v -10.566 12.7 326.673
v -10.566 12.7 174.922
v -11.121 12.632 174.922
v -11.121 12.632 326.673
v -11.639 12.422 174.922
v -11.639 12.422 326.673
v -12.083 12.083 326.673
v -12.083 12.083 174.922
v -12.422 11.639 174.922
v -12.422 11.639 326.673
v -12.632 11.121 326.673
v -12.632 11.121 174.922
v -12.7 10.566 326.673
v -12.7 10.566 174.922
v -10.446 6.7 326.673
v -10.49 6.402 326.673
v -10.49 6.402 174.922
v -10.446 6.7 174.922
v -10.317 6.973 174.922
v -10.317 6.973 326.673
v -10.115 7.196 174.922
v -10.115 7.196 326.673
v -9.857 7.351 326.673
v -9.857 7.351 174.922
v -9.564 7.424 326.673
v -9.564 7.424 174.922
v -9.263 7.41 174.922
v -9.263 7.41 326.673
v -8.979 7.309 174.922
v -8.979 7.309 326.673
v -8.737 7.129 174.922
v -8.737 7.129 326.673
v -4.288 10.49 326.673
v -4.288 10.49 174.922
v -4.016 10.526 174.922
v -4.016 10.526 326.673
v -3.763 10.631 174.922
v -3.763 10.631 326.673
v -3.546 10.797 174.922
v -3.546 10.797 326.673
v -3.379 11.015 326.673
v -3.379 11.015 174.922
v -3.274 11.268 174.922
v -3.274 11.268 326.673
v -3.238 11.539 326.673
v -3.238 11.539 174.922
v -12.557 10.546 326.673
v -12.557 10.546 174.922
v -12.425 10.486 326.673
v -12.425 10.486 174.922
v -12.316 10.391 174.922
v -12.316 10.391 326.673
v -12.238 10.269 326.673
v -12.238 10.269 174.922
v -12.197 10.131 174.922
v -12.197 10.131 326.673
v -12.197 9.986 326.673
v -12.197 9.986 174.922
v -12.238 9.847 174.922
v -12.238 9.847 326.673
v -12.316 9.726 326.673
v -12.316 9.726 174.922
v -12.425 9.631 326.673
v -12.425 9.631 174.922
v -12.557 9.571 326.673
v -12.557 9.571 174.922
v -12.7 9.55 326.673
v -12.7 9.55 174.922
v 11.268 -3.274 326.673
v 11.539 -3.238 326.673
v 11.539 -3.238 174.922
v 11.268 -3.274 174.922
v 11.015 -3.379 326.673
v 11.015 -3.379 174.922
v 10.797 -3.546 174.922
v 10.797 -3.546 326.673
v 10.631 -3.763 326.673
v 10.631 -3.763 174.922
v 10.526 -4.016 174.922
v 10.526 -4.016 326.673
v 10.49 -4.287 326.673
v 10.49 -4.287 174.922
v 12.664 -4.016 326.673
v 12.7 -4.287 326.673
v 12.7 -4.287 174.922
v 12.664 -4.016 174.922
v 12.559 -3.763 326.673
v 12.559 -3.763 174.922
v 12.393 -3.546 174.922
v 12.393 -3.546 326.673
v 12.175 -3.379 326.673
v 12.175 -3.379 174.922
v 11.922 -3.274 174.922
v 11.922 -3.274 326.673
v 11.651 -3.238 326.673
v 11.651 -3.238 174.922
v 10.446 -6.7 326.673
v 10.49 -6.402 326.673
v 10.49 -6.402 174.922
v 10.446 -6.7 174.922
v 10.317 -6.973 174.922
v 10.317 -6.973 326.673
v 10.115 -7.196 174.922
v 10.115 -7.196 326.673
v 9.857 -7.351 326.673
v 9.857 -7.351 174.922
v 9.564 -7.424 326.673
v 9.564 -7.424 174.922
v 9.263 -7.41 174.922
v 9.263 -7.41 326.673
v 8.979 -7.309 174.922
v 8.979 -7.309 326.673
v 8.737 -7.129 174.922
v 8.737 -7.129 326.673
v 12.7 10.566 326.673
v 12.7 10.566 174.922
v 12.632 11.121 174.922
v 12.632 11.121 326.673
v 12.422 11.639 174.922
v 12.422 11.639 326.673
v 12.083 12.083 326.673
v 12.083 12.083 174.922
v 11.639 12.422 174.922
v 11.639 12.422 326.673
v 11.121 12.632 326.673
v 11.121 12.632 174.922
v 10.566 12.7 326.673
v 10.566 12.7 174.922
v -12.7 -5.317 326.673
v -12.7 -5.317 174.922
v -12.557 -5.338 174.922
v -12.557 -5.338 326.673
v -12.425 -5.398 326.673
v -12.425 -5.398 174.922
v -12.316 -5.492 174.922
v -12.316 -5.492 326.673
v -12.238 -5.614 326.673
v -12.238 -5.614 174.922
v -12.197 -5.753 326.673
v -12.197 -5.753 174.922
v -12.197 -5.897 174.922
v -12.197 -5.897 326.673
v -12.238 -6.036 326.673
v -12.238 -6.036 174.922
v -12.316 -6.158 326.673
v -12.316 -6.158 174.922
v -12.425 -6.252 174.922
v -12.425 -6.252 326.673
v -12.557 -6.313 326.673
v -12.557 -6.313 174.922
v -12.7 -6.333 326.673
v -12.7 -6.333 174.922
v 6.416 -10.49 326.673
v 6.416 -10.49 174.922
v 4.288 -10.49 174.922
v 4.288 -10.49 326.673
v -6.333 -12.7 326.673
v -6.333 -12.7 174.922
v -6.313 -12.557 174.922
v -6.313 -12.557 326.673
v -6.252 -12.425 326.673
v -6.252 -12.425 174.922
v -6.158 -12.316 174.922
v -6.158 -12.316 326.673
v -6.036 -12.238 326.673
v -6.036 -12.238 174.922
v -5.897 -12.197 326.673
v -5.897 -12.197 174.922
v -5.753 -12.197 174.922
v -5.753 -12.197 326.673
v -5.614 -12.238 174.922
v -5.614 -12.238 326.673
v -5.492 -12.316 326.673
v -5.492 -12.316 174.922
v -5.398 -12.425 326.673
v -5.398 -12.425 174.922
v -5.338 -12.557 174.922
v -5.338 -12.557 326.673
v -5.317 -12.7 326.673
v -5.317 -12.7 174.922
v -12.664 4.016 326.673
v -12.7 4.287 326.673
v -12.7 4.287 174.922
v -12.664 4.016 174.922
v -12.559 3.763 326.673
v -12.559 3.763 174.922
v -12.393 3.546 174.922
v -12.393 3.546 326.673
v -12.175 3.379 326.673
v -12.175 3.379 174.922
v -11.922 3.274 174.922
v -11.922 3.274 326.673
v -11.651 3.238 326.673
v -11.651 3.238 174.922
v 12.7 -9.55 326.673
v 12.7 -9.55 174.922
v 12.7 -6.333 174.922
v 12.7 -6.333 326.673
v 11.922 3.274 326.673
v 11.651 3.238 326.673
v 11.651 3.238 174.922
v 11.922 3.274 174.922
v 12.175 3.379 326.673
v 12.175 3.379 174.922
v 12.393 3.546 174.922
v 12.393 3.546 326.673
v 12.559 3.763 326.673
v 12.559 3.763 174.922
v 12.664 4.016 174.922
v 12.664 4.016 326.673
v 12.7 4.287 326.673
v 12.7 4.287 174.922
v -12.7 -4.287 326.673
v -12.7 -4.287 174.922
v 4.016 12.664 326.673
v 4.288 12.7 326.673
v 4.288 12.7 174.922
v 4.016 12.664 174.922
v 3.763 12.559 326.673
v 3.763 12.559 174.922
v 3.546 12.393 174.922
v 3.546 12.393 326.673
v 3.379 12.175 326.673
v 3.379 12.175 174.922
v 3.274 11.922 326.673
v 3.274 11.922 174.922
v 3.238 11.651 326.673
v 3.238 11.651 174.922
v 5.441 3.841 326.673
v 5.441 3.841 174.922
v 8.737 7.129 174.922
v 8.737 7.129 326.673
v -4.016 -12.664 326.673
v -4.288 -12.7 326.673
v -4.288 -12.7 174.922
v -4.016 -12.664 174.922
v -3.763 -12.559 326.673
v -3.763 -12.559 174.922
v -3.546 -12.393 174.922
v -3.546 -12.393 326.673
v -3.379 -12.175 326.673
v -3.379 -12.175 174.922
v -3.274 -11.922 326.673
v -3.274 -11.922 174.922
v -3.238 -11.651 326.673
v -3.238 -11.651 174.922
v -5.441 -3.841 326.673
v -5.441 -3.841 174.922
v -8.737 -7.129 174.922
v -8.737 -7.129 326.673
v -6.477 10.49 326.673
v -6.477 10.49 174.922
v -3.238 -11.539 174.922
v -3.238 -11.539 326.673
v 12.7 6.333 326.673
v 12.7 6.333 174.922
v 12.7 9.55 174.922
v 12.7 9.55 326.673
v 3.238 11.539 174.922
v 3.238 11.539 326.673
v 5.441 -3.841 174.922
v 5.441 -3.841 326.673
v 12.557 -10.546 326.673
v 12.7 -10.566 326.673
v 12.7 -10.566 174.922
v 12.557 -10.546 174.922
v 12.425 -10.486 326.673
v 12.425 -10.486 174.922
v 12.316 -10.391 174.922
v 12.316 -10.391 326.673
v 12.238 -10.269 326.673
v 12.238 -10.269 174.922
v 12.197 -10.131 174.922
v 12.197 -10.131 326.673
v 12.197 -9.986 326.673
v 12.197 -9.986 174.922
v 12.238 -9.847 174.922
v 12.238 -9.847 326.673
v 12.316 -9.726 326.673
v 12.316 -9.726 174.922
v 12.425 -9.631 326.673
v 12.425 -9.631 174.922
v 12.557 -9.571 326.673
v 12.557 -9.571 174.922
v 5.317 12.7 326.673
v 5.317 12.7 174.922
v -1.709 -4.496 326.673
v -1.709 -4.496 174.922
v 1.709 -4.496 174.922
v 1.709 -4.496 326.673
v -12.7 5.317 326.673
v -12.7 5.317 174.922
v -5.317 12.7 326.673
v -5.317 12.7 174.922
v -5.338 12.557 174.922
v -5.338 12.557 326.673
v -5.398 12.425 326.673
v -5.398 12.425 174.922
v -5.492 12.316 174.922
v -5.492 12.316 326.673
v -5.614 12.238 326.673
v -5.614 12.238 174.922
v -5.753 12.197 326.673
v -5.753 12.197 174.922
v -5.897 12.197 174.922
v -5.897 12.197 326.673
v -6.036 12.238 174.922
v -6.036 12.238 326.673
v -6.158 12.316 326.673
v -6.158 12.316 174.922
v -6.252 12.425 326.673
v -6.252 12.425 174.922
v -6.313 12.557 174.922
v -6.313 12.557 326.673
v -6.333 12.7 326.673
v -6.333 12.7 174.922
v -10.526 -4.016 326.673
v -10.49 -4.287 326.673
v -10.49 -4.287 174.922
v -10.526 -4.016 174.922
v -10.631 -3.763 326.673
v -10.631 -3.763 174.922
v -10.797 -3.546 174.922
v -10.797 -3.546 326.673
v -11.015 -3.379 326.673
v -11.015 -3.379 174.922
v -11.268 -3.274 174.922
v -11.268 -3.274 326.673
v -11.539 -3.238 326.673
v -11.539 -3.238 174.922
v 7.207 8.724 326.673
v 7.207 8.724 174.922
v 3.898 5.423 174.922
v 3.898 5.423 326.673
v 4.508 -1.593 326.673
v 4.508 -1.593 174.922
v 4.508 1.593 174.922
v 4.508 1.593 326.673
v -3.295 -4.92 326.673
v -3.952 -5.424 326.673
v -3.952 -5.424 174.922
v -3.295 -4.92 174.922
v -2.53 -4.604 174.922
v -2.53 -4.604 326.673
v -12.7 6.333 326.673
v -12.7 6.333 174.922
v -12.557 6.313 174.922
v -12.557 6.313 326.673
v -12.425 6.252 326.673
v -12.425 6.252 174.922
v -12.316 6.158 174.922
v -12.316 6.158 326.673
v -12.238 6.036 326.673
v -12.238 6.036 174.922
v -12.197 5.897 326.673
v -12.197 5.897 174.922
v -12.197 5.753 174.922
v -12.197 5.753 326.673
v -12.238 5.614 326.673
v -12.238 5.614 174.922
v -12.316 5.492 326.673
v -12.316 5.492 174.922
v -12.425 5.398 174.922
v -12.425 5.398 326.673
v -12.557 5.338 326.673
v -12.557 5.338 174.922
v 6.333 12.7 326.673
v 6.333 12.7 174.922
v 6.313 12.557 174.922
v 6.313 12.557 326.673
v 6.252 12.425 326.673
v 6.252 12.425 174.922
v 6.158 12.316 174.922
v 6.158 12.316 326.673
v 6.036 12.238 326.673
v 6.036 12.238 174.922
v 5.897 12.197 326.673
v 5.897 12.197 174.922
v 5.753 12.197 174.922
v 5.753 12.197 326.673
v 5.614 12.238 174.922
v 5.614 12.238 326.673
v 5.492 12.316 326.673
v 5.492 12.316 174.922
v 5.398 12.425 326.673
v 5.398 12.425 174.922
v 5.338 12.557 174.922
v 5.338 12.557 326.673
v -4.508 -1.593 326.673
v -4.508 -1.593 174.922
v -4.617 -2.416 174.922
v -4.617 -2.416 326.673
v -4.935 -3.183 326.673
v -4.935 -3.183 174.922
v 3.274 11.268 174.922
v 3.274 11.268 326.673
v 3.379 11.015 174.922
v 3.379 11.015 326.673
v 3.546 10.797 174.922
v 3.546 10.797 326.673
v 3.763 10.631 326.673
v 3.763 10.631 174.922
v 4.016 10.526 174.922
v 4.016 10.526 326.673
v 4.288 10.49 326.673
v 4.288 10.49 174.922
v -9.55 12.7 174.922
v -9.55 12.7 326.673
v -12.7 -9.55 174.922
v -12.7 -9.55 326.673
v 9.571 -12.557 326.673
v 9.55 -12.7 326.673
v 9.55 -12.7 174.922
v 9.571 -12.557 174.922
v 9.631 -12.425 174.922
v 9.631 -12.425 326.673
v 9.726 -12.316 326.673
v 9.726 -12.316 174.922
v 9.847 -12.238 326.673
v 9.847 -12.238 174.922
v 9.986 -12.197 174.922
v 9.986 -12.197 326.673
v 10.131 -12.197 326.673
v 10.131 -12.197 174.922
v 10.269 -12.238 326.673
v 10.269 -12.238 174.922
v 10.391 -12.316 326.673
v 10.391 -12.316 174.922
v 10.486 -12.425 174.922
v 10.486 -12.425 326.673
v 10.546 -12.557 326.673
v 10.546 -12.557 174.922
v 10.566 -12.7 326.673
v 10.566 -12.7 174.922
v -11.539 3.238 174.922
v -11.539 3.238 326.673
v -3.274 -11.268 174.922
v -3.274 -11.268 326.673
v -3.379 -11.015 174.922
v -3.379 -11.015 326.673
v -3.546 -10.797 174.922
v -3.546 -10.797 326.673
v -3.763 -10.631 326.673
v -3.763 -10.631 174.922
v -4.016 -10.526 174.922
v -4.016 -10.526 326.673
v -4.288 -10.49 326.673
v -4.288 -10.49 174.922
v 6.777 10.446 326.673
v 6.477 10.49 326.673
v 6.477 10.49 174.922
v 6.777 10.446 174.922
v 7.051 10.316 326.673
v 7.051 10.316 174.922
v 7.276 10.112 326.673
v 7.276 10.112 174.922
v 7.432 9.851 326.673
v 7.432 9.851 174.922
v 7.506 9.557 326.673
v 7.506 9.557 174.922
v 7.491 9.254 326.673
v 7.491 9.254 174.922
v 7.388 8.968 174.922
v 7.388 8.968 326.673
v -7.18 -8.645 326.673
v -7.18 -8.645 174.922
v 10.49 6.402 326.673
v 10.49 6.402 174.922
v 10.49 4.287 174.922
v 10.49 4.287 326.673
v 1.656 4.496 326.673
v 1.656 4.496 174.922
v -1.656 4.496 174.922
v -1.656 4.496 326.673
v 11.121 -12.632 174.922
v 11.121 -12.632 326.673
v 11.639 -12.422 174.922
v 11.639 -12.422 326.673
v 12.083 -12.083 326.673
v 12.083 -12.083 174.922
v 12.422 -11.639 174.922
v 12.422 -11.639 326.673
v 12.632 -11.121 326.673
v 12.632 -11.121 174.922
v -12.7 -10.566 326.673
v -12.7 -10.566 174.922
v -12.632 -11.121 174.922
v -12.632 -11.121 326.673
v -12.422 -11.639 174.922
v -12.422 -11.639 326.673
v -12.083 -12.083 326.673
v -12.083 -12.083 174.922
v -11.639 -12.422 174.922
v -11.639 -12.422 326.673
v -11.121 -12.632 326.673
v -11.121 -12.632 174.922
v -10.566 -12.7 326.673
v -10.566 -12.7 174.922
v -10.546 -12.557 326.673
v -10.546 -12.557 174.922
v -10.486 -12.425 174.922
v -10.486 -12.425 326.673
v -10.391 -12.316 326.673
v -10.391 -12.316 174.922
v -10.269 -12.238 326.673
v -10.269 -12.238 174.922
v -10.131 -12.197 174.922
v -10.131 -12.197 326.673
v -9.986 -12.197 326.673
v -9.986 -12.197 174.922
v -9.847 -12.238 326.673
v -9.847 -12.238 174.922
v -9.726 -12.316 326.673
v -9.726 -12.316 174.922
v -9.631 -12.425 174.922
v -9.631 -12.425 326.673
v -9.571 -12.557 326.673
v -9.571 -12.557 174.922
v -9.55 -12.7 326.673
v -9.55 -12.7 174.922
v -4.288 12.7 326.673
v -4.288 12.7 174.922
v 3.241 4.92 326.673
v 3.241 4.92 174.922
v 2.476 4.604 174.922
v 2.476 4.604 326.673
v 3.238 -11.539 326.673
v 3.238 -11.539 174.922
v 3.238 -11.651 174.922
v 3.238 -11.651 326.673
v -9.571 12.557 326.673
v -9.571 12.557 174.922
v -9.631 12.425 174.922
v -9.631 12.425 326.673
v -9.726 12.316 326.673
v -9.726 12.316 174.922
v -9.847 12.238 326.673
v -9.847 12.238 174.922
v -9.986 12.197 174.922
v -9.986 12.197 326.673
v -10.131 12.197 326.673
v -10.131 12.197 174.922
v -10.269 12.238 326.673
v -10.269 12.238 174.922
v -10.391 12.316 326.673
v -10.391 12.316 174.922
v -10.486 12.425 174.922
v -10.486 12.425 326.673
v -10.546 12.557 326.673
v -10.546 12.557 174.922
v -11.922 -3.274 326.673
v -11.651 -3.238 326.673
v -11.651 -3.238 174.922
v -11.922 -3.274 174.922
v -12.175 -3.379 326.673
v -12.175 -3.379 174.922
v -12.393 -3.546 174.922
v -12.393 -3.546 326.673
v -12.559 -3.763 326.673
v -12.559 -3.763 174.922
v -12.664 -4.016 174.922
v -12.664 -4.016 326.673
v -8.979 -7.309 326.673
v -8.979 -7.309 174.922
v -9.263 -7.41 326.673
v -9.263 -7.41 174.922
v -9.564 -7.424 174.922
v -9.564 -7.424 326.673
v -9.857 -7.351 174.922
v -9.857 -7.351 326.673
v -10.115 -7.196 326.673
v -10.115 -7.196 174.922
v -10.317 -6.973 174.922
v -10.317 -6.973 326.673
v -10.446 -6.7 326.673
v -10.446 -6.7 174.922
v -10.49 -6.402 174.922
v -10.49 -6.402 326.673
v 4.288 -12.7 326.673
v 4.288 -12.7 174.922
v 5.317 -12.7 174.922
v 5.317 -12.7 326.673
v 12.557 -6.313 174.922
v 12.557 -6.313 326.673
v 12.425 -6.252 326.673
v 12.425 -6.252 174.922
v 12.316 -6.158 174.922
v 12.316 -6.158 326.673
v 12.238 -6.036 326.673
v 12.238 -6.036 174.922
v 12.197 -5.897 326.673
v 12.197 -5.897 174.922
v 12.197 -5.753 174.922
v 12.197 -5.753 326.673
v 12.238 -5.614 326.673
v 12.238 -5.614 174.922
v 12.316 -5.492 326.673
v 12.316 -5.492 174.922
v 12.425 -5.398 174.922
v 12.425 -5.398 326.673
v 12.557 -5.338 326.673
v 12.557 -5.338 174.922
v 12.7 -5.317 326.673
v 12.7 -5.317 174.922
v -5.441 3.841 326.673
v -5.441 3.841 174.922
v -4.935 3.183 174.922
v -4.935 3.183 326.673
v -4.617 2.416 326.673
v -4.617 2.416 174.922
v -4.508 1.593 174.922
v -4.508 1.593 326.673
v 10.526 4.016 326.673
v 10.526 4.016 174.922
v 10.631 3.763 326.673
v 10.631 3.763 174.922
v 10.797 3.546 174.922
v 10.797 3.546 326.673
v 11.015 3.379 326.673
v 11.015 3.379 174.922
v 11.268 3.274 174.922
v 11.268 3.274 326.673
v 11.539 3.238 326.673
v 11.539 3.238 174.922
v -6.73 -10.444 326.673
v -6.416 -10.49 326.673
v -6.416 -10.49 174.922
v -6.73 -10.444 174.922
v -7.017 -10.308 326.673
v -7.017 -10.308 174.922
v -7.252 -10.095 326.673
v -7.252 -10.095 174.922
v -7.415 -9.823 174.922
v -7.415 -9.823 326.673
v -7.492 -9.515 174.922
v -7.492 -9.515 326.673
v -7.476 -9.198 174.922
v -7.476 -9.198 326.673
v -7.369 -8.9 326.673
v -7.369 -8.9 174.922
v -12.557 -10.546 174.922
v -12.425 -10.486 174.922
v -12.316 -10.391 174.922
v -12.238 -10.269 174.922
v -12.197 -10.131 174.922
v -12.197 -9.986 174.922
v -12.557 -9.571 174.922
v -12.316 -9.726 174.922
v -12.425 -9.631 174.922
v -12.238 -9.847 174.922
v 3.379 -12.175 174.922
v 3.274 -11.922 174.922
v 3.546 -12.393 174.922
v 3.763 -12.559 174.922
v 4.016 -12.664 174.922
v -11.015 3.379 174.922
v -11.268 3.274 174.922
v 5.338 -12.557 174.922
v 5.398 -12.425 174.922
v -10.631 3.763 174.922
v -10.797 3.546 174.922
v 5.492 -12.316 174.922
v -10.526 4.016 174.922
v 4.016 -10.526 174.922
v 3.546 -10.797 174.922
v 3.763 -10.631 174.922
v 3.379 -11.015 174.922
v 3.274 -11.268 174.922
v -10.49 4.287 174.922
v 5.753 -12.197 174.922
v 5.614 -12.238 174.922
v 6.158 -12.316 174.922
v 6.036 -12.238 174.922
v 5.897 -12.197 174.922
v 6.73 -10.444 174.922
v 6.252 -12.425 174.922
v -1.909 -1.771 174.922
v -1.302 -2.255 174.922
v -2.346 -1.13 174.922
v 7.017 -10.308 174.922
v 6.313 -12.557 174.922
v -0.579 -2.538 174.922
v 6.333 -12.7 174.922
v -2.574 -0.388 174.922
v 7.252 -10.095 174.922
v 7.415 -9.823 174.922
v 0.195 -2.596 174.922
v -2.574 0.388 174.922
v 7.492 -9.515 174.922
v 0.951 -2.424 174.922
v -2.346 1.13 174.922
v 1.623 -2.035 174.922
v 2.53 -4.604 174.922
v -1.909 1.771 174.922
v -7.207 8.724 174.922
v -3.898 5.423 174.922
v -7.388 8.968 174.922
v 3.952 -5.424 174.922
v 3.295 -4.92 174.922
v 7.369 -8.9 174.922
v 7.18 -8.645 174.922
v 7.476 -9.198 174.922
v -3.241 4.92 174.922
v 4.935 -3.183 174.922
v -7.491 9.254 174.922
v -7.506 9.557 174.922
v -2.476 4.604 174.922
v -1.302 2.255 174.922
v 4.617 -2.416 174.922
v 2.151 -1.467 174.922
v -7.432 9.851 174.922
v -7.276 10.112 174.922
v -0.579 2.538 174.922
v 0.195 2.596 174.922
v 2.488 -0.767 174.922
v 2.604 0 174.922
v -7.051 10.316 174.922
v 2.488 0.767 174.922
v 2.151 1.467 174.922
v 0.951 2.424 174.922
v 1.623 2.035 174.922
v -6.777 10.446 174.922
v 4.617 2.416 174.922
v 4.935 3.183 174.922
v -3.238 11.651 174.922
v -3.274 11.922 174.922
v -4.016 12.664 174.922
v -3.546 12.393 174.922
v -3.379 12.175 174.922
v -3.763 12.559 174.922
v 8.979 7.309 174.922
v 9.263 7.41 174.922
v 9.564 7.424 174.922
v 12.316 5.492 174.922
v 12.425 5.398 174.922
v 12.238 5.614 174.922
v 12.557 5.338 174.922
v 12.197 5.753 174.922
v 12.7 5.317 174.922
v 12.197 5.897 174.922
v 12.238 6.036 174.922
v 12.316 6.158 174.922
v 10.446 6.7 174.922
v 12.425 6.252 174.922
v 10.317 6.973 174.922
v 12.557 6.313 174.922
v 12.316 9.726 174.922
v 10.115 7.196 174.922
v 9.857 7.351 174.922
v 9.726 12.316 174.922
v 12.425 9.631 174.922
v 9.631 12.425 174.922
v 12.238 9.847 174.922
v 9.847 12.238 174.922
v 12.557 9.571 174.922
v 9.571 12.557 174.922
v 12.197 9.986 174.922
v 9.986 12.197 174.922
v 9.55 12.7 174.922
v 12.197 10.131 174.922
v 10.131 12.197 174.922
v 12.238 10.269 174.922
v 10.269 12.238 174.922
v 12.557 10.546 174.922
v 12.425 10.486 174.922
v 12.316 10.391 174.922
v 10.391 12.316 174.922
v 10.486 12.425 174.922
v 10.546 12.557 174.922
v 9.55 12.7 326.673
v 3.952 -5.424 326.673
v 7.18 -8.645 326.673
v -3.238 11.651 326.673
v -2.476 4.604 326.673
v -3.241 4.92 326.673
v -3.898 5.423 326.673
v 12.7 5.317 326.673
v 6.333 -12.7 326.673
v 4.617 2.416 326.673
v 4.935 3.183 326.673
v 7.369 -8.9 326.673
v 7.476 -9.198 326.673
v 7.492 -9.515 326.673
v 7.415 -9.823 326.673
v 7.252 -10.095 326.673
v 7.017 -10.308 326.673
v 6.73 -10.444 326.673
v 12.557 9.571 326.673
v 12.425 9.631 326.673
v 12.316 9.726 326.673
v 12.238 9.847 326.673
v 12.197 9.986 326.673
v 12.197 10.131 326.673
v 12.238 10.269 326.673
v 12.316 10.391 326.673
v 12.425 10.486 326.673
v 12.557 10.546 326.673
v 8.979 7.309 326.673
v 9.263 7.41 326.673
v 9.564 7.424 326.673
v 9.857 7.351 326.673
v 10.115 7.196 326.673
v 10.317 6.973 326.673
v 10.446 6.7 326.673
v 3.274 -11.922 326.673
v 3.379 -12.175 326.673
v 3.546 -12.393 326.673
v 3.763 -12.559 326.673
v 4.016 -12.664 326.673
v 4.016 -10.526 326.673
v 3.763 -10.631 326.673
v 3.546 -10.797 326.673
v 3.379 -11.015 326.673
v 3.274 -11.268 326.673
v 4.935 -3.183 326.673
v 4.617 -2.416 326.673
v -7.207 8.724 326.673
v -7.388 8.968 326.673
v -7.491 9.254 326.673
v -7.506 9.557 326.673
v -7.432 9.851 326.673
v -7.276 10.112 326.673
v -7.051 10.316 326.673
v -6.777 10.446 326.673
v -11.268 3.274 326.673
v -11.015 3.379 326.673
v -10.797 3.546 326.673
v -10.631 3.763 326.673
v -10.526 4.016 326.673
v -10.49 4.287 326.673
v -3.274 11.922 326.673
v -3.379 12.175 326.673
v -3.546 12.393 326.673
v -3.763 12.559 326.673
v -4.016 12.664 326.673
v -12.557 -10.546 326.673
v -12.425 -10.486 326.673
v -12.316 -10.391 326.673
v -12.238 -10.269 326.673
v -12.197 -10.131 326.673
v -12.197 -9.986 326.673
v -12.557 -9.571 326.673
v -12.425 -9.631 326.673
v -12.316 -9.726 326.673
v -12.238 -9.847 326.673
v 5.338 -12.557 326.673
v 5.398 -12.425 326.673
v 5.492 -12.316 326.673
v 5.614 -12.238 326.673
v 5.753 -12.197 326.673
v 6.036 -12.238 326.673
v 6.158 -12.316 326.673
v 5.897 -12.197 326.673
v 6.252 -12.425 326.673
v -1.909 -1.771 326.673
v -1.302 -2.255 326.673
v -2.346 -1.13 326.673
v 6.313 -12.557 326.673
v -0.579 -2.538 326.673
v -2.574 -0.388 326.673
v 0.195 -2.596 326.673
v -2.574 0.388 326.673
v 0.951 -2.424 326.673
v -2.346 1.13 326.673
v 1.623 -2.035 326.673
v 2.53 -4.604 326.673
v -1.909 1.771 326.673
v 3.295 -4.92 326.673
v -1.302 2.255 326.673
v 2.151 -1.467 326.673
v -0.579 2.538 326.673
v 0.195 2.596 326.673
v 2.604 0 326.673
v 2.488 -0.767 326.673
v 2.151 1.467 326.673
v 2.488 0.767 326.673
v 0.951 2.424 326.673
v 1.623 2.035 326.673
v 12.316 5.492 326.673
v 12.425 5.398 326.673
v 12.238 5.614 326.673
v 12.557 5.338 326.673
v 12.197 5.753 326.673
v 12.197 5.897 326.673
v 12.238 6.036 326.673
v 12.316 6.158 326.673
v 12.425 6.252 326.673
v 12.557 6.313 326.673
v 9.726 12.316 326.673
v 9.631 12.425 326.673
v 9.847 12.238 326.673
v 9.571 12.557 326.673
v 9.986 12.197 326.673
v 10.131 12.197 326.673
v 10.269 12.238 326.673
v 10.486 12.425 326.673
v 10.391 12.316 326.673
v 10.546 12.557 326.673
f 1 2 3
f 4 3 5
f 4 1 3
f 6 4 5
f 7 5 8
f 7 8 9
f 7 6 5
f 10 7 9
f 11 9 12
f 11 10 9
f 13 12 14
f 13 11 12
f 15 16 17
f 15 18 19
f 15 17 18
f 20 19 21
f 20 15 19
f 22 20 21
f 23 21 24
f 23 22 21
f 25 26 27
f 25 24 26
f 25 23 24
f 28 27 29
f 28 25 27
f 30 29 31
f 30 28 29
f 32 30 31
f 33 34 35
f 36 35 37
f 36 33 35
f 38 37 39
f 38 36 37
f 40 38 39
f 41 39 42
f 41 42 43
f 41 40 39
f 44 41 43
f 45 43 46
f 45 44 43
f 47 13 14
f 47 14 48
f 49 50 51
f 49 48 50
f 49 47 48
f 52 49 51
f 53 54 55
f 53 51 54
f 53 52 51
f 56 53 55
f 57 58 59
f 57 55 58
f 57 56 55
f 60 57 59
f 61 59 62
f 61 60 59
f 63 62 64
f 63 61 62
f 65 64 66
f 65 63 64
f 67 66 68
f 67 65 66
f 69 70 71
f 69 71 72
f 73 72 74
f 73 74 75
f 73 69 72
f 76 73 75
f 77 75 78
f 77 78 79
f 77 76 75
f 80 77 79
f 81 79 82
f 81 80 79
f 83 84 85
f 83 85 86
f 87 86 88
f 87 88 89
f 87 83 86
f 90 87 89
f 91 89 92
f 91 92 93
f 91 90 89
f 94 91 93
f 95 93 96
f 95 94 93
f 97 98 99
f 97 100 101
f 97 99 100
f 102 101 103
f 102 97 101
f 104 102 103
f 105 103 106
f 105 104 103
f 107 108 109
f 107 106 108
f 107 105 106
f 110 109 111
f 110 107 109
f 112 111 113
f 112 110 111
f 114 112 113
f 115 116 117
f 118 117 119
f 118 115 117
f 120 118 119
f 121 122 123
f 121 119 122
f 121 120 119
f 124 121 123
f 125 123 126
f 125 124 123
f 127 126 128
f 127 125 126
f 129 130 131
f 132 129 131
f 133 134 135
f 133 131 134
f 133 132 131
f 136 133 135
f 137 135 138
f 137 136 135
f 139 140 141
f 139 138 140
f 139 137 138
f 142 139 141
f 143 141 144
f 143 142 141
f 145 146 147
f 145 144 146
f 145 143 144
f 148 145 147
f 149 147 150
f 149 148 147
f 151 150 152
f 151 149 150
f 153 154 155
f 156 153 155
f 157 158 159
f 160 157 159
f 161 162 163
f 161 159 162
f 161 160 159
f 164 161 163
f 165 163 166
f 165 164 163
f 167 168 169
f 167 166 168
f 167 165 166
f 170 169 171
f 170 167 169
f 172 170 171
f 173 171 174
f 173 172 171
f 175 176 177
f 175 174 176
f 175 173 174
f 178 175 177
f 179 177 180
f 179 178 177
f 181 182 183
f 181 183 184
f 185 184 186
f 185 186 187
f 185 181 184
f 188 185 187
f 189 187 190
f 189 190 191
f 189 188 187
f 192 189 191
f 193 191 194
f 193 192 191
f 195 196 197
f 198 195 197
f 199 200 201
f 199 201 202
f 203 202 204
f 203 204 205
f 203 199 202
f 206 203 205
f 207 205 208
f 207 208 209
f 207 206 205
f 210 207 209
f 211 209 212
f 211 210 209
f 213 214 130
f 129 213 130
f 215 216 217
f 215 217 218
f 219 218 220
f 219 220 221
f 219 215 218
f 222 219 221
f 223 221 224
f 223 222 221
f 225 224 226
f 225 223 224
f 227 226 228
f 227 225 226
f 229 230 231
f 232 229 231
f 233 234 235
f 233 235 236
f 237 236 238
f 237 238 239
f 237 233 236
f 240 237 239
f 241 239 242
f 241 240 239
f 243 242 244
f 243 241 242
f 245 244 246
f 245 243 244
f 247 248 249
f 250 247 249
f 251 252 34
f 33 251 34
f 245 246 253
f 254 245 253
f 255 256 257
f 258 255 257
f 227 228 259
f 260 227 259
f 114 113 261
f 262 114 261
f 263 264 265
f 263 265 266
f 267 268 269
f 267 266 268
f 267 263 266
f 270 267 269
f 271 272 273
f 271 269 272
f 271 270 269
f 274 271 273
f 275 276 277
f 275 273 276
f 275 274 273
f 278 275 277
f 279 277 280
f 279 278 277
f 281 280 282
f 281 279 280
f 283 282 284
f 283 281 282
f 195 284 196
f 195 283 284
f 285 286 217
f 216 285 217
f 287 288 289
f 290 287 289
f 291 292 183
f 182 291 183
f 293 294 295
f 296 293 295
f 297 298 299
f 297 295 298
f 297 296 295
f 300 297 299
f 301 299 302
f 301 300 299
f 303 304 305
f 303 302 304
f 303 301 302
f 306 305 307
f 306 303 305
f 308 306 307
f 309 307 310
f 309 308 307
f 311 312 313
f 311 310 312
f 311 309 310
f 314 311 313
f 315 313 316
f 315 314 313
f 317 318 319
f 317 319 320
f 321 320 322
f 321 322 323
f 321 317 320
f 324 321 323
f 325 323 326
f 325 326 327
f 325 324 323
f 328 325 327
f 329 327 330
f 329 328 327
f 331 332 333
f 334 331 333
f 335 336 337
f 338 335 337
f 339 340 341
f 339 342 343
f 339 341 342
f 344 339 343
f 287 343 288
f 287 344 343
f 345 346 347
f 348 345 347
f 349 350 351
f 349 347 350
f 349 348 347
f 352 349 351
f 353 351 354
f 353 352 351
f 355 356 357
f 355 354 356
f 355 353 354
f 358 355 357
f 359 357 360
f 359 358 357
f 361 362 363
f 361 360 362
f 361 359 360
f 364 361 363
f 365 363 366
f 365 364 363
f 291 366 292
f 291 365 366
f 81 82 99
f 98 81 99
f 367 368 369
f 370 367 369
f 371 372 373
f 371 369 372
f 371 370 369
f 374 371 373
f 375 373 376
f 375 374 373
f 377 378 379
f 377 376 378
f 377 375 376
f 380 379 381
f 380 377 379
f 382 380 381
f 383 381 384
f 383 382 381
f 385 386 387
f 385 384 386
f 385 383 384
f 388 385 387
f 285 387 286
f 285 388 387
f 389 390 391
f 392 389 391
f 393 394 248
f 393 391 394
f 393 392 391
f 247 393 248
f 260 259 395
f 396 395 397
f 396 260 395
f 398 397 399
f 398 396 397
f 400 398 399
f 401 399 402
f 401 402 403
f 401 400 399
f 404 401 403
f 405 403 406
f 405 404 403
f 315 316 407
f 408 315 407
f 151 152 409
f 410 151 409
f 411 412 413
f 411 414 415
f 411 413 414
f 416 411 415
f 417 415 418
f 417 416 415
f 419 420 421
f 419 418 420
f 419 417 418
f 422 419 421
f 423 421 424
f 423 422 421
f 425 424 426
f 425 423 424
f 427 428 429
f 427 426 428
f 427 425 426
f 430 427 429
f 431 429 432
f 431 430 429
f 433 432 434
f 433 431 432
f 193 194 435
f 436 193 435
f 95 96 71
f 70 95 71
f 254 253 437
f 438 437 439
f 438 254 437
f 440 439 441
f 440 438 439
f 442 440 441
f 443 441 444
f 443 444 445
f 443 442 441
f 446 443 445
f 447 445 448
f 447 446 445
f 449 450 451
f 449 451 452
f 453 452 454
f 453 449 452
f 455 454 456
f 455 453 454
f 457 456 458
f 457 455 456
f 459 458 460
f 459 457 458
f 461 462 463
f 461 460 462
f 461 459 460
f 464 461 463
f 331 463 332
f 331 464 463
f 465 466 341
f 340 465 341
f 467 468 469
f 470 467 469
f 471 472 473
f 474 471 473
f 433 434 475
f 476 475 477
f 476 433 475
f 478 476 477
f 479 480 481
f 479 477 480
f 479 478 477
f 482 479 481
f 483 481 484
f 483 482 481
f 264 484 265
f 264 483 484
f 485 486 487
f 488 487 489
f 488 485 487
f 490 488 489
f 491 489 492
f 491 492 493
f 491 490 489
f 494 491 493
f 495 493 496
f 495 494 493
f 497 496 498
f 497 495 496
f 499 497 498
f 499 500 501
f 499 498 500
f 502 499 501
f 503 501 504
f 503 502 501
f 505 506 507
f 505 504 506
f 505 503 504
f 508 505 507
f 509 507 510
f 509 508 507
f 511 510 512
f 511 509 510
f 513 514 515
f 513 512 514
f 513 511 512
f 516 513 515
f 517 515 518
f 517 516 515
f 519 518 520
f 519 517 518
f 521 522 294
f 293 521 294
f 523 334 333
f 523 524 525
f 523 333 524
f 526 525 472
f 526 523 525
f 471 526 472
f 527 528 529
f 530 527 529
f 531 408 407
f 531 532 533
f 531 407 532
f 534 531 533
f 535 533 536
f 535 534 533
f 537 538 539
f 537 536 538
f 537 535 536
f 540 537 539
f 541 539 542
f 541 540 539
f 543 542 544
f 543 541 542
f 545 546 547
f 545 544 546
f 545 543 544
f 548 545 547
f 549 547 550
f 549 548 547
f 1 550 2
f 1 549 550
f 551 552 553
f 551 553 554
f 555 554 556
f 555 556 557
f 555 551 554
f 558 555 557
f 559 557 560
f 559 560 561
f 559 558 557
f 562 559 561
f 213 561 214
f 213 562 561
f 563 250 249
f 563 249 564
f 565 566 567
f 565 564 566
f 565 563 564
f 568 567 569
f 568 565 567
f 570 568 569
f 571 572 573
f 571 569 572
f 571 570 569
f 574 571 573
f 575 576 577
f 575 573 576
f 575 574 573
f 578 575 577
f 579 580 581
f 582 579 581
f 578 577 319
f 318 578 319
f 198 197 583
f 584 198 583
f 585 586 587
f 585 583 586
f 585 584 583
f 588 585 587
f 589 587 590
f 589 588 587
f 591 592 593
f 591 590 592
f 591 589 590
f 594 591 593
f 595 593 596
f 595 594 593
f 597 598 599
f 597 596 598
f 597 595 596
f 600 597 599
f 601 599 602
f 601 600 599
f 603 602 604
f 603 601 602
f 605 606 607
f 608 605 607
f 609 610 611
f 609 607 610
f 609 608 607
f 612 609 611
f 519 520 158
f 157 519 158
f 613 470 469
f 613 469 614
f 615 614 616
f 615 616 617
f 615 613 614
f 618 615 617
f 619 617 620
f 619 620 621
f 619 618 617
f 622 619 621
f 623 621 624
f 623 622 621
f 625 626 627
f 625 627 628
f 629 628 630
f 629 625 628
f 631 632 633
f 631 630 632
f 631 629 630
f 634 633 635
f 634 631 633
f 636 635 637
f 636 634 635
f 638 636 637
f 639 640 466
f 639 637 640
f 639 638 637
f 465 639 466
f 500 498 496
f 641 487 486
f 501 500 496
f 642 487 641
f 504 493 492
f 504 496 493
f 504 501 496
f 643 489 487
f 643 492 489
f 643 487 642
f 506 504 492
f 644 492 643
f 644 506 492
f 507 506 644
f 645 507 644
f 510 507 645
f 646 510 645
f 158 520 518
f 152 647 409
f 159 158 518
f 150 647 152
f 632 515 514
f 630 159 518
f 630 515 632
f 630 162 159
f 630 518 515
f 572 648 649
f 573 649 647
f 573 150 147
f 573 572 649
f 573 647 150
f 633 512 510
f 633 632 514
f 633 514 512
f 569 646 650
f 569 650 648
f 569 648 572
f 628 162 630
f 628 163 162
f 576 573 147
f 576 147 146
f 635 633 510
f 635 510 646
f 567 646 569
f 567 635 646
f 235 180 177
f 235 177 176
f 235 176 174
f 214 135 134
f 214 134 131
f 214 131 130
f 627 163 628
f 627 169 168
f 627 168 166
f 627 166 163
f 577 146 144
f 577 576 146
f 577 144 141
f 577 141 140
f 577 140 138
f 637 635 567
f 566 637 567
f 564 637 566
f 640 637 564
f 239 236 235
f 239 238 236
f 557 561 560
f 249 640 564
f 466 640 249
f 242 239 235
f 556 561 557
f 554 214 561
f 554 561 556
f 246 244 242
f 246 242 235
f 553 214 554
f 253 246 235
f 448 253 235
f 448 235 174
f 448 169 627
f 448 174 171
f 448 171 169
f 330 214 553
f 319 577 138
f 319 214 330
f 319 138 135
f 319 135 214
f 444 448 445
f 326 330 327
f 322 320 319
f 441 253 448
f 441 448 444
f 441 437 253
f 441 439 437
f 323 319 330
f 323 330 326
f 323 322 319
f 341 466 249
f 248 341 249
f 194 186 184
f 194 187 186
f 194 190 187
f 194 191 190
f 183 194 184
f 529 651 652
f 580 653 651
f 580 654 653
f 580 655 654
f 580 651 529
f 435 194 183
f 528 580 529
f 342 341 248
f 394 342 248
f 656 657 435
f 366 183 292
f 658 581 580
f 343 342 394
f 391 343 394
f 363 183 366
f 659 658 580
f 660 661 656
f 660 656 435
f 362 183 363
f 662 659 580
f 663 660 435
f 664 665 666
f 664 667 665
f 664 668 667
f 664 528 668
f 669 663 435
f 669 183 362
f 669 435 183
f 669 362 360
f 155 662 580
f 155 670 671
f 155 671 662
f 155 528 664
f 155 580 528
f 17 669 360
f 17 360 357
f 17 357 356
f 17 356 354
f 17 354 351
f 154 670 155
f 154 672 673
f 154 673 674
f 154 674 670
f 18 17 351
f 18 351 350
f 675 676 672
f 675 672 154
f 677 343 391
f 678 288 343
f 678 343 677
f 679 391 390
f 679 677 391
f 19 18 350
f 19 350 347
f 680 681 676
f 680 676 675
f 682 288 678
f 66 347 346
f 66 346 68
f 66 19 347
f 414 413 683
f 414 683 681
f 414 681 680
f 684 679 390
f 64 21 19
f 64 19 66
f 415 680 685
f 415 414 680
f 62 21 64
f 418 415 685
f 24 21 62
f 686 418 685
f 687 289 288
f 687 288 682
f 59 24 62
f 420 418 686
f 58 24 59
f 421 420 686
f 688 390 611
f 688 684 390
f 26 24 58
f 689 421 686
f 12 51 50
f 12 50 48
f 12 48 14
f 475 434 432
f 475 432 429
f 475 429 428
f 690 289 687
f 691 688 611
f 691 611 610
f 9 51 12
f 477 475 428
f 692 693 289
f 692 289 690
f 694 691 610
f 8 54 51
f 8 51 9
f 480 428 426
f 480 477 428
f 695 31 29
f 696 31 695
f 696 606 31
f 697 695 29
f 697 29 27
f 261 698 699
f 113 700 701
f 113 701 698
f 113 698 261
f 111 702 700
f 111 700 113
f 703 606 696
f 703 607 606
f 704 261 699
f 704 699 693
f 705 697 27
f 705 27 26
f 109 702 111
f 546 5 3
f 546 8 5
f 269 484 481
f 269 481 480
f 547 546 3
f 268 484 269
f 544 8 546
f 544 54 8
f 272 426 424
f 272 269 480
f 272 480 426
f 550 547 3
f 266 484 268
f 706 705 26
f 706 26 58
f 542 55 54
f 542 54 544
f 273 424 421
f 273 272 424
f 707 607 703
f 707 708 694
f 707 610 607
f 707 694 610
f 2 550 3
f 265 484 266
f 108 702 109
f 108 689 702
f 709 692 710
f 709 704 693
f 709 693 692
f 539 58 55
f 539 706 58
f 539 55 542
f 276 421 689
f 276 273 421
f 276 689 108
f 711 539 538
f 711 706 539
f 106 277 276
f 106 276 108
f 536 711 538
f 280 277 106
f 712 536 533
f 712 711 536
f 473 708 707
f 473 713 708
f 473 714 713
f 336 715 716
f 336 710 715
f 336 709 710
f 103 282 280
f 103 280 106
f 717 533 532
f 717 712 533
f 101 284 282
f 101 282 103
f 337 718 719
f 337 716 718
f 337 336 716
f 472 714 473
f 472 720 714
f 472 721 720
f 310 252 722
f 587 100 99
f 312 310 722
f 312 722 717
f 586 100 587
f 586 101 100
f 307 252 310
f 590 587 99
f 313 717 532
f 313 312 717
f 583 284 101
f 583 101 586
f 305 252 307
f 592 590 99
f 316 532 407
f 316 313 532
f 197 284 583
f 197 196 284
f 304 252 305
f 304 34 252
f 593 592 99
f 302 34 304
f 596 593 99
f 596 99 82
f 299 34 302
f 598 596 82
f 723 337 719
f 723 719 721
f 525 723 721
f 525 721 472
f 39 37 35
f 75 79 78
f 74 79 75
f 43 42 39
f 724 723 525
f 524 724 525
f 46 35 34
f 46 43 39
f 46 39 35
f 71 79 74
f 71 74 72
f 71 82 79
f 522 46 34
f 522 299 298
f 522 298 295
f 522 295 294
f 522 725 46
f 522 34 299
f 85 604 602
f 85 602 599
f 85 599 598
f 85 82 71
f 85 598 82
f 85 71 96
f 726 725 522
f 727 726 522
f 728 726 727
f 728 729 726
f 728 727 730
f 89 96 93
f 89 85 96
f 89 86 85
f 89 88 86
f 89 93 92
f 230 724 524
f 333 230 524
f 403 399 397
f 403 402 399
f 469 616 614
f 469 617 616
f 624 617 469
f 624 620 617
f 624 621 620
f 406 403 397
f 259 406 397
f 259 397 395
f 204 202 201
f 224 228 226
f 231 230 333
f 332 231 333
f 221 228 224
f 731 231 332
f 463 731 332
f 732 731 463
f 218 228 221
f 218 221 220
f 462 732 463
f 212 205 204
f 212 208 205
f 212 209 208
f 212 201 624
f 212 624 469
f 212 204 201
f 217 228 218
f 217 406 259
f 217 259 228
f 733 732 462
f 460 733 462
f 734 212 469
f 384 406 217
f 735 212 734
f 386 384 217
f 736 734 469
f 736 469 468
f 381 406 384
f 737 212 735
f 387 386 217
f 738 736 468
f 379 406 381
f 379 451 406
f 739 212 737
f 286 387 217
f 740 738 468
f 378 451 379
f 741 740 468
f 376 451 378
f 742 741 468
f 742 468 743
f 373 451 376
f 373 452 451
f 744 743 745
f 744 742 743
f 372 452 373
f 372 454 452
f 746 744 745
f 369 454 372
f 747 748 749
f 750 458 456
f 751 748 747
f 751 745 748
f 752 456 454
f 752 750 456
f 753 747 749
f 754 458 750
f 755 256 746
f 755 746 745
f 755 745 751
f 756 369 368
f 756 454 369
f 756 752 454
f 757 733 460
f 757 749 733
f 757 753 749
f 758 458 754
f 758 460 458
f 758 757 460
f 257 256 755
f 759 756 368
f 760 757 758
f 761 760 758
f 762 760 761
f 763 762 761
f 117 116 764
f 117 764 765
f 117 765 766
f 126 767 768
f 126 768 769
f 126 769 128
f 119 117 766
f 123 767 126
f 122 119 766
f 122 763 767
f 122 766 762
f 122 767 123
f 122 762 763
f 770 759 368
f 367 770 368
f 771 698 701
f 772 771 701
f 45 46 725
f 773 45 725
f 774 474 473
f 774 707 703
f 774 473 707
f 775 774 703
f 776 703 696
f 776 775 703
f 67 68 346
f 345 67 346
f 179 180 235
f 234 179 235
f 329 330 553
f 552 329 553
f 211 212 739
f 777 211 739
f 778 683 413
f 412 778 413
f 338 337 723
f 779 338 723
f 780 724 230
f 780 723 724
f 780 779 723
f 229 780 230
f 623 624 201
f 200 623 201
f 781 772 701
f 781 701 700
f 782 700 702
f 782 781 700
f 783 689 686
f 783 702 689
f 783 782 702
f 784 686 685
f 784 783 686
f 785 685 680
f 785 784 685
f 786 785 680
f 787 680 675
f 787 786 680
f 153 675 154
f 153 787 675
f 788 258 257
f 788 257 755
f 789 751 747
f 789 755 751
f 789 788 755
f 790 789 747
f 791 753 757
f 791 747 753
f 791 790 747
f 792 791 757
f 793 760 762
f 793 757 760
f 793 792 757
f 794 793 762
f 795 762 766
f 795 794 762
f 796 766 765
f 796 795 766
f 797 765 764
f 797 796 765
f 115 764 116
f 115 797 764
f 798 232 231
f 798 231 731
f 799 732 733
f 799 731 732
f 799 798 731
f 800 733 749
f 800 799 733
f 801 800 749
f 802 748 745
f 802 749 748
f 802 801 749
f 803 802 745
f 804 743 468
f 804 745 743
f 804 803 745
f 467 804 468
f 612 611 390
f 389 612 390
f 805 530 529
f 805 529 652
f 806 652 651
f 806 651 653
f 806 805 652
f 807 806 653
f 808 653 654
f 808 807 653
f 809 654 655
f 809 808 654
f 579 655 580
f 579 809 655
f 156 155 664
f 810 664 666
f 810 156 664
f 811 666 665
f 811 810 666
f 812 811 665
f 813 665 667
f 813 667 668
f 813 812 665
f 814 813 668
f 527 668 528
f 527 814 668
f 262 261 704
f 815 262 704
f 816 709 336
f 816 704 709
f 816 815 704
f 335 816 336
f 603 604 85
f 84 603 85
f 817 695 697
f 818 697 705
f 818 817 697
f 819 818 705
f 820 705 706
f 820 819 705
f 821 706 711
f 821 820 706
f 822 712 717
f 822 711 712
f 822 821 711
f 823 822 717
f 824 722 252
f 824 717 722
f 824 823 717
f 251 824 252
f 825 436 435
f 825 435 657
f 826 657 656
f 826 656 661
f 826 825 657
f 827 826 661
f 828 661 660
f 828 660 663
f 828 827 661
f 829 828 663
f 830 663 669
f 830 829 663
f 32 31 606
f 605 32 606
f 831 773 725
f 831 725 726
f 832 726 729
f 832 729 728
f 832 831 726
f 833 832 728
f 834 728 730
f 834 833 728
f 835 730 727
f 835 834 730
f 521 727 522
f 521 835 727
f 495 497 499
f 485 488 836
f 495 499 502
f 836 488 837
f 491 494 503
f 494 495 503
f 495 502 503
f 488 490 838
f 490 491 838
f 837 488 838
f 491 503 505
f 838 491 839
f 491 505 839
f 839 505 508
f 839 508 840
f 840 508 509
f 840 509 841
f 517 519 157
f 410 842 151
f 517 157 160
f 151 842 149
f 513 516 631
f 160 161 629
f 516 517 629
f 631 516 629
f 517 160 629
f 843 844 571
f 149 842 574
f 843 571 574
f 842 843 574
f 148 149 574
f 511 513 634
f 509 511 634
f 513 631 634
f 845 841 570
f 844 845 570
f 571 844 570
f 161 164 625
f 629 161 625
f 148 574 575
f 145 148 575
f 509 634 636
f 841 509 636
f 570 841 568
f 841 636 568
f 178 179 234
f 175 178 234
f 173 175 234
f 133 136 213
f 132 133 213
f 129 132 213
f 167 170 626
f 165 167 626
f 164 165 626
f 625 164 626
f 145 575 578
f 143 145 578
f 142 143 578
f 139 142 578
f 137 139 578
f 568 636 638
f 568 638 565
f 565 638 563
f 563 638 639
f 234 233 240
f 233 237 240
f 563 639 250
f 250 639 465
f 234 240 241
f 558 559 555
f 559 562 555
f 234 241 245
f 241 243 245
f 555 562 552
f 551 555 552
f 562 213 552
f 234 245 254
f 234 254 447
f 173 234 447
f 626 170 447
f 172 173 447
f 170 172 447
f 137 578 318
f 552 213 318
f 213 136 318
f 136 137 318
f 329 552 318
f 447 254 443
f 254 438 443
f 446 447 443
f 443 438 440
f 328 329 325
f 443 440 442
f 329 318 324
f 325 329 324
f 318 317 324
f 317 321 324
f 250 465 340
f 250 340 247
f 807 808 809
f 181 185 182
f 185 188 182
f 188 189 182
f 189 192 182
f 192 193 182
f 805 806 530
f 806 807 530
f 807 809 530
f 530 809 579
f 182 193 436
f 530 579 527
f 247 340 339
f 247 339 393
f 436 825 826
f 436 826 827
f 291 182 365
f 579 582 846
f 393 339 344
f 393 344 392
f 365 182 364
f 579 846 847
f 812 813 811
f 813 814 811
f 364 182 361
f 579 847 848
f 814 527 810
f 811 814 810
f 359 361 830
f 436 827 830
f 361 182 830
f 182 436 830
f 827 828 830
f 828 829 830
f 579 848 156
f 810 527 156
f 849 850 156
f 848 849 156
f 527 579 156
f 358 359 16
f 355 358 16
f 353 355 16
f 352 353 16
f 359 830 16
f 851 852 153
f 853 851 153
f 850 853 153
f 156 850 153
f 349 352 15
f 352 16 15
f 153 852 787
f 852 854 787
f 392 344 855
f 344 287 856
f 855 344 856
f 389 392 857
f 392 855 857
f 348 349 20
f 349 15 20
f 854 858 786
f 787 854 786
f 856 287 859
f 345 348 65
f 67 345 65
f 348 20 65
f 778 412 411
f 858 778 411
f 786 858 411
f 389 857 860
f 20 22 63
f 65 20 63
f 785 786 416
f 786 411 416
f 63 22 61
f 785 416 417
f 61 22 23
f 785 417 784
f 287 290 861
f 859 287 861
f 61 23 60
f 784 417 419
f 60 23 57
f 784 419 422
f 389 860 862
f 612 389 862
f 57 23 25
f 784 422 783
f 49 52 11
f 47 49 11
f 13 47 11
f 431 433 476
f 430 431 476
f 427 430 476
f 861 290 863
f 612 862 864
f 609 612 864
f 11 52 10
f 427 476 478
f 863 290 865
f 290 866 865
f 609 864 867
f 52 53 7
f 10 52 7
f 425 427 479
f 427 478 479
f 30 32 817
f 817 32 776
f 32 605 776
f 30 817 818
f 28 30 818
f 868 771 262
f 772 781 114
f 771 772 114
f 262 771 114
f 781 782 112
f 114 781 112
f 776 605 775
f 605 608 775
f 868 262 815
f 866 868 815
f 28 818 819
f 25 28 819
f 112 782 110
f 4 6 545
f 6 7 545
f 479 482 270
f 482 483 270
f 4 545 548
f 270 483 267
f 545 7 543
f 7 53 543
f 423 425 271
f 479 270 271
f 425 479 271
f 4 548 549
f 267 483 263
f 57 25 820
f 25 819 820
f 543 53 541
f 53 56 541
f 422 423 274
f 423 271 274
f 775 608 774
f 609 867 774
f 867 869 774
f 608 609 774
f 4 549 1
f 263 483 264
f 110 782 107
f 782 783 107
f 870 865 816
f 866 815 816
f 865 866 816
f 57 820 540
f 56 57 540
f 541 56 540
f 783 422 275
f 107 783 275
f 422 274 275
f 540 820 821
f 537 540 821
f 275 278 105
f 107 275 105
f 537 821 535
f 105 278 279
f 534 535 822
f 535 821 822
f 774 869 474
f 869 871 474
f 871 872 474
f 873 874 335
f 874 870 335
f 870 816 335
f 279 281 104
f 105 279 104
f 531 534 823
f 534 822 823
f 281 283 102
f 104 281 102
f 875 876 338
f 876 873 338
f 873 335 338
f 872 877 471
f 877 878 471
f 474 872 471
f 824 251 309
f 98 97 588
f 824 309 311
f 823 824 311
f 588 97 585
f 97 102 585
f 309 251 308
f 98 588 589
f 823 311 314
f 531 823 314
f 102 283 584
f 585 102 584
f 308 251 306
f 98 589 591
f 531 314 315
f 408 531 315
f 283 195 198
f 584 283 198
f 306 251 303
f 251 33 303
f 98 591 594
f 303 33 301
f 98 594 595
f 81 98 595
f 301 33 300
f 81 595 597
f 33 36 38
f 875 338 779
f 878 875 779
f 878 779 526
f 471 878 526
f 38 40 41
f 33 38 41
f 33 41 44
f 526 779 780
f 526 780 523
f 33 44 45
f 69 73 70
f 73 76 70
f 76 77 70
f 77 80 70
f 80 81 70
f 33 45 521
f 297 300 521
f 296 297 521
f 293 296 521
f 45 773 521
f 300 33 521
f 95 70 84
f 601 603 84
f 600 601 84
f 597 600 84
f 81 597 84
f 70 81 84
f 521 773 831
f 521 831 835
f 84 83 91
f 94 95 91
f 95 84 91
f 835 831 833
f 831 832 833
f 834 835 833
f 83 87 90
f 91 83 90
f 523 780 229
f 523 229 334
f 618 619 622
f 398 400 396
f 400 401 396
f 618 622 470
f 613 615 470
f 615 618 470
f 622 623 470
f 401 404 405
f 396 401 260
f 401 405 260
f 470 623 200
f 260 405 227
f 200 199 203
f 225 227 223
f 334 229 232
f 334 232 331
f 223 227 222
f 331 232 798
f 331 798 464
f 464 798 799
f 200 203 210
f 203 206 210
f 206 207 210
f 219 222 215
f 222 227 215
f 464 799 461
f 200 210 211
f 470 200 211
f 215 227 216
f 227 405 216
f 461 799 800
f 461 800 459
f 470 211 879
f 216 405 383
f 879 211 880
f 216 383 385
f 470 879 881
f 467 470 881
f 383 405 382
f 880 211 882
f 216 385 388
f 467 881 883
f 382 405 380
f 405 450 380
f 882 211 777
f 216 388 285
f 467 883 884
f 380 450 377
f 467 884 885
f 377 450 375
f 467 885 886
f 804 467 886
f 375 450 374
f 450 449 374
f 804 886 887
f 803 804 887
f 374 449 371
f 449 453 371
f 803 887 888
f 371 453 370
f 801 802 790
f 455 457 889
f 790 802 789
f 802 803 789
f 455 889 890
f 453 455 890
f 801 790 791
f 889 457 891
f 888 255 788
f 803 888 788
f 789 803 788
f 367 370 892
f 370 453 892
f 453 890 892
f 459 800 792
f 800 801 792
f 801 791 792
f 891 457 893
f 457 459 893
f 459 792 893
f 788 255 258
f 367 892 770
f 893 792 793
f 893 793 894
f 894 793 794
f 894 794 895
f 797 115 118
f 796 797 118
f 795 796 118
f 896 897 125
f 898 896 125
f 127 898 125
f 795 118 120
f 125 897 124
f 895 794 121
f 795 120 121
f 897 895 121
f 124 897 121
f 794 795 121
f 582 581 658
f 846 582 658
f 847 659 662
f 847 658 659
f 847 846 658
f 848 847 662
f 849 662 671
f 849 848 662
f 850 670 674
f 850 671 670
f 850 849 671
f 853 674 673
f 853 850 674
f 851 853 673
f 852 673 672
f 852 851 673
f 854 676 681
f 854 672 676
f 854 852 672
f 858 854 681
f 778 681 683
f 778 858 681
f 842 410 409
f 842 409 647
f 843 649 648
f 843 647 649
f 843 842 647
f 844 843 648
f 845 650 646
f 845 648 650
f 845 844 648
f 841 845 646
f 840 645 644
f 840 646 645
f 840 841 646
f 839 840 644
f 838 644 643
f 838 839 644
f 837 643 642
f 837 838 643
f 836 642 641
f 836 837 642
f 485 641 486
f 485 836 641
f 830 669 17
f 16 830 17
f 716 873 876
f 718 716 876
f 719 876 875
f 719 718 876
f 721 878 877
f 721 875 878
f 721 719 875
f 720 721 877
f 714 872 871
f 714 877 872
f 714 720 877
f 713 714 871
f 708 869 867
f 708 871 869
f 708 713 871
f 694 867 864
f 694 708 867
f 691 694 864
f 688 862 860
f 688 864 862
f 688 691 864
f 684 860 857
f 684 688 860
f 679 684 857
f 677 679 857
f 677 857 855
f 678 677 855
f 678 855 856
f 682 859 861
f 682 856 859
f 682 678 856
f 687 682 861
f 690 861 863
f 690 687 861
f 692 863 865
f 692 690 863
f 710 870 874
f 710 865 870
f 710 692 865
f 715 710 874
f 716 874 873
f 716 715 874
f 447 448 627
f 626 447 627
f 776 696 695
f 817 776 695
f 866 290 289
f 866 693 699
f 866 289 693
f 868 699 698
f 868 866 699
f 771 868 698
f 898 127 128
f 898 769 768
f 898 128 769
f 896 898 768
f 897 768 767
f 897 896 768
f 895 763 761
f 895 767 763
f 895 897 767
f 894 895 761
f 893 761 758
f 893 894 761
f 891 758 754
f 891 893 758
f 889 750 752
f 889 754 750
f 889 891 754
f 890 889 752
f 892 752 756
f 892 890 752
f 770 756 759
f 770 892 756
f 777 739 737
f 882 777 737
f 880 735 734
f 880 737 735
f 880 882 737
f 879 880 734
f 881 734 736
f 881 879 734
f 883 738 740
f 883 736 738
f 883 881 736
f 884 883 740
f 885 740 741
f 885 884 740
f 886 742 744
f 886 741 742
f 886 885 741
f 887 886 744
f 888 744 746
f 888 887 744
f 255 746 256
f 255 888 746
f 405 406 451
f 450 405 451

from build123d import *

# Parameters (mm, degrees)
SKETCH1_R           = 2.6035
BOSS_EXTRUDE1_DEPTH = 914.4
SKETCH2_W           = 591.784504761
SKETCH2_H           = 34.760821459
SKETCH2_W_2         = 1099.97900941
SKETCH2_H_2         = 36.169365112
CUT_EXTRUDE1_DEPTH  = 27.432


with BuildPart() as part:
    # Sketch1 → Boss-Extrude1 (new body, symmetric)
    with BuildSketch(Plane.XY):
        with BuildLine():
            Line((-7.179650497, -8.645192506), (-3.952270251, -5.423690499))
            ThreePointArc((-3.952270251, -5.423690499), (-2.922936451, -4.736929036), (-1.709253557, -4.4958))
            Line((-1.709253557, -4.4958), (1.709253557, -4.4958))
            ThreePointArc((1.709253557, -4.4958), (2.922936451, -4.736929036), (3.952270251, -5.423690499))
            Line((3.952270251, -5.423690499), (7.179650497, -8.645192506))
            ThreePointArc((7.179650497, -8.645192506), (7.41473083, -9.822813117), (6.416408329, -10.4902))
            Line((6.416408329, -10.4902), (4.287512407, -10.4902))
            ThreePointArc((4.287512407, -10.4902), (3.54574862, -10.79744862), (3.2385, -11.539212407))
            Line((3.2385, -11.539212407), (3.2385, -11.650987593))
            ThreePointArc((3.2385, -11.650987593), (3.54574862, -12.39275138), (4.287512407, -12.7))
            Line((4.287512407, -12.7), (5.317126718, -12.7))
            ThreePointArc((5.317126718, -12.7), (5.825126718, -12.192), (6.333126718, -12.7))
            Line((6.333126718, -12.7), (9.550443118, -12.7))
            ThreePointArc((9.550443118, -12.7), (10.058366869, -12.192000006), (10.566443095, -12.699847501))
            ThreePointArc((10.566443095, -12.699847501), (12.082537762, -12.08250727), (12.699846982, -10.566399977))
            ThreePointArc((12.699846982, -10.566399977), (12.192000006, -10.058323491), (12.7, -9.5504))
            Line((12.7, -9.5504), (12.7, -6.3330836))
            ThreePointArc((12.7, -6.3330836), (12.192, -5.8250836), (12.7, -5.3170836))
            Line((12.7, -5.3170836), (12.7, -4.287469289))
            ThreePointArc((12.7, -4.287469289), (12.39275138, -3.545705502), (11.650987593, -3.238456882))
            Line((11.650987593, -3.238456882), (11.539212407, -3.238456882))
            ThreePointArc((11.539212407, -3.238456882), (10.79744862, -3.545705502), (10.4902, -4.287469289))
            Line((10.4902, -4.287469289), (10.4902, -6.402089023))
            ThreePointArc((10.4902, -6.402089023), (9.856505071, -7.351067942), (8.737131347, -7.129408934))
            Line((8.737131347, -7.129408934), (5.441005833, -3.840816462))
            ThreePointArc((5.441005833, -3.840816462), (4.750877967, -2.809883091), (4.5085, -1.593185507))
            Line((4.5085, -1.593185507), (4.5085, 1.593185507))
            ThreePointArc((4.5085, 1.593185507), (4.750877967, 2.809883091), (5.441005833, 3.840816462))
            Line((5.441005833, 3.840816462), (8.737131347, 7.129408934))
            ThreePointArc((8.737131347, 7.129408934), (9.856505071, 7.351067942), (10.4902, 6.402089023))
            Line((10.4902, 6.402089023), (10.4902, 4.287469289))
            ThreePointArc((10.4902, 4.287469289), (10.79744862, 3.545705502), (11.539212407, 3.238456882))
            Line((11.539212407, 3.238456882), (11.650987593, 3.238456882))
            ThreePointArc((11.650987593, 3.238456882), (12.39275138, 3.545705502), (12.7, 4.287469289))
            Line((12.7, 4.287469289), (12.7, 5.3170836))
            ThreePointArc((12.7, 5.3170836), (12.192, 5.8250836), (12.7, 6.3330836))
            Line((12.7, 6.3330836), (12.7, 9.5504))
            ThreePointArc((12.7, 9.5504), (12.192000006, 10.058323491), (12.699846982, 10.566399977))
            ThreePointArc((12.699846982, 10.566399977), (12.082537762, 12.08250727), (10.566443095, 12.699847501))
            ThreePointArc((10.566443095, 12.699847501), (10.058366869, 12.192000006), (9.550443118, 12.7))
            Line((9.550443118, 12.7), (6.333126718, 12.7))
            ThreePointArc((6.333126718, 12.7), (5.825126718, 12.192), (5.317126718, 12.7))
            Line((5.317126718, 12.7), (4.287512407, 12.7))
            ThreePointArc((4.287512407, 12.7), (3.54574862, 12.39275138), (3.2385, 11.650987593))
            Line((3.2385, 11.650987593), (3.2385, 11.539212407))
            ThreePointArc((3.2385, 11.539212407), (3.54574862, 10.79744862), (4.287512407, 10.4902))
            Line((4.287512407, 10.4902), (6.476788598, 10.4902))
            ThreePointArc((6.476788598, 10.4902), (7.432222385, 9.85140422), (7.207036008, 8.724370562))
            Line((7.207036008, 8.724370562), (3.898272566, 5.423169045))
            ThreePointArc((3.898272566, 5.423169045), (2.869120213, 4.736787962), (1.655778399, 4.4958))
            Line((1.655778399, 4.4958), (-1.655778399, 4.4958))
            ThreePointArc((-1.655778399, 4.4958), (-2.869120213, 4.736787962), (-3.898272566, 5.423169045))
            Line((-3.898272566, 5.423169045), (-7.207036008, 8.724370562))
            ThreePointArc((-7.207036008, 8.724370562), (-7.432222385, 9.85140422), (-6.476788598, 10.4902))
            Line((-6.476788598, 10.4902), (-4.287512407, 10.4902))
            ThreePointArc((-4.287512407, 10.4902), (-3.54574862, 10.79744862), (-3.2385, 11.539212407))
            Line((-3.2385, 11.539212407), (-3.2385, 11.650987593))
            ThreePointArc((-3.2385, 11.650987593), (-3.54574862, 12.39275138), (-4.287512407, 12.7))
            Line((-4.287512407, 12.7), (-5.317126718, 12.7))
            ThreePointArc((-5.317126718, 12.7), (-5.825126718, 12.192), (-6.333126718, 12.7))
            Line((-6.333126718, 12.7), (-9.550443118, 12.7))
            ThreePointArc((-9.550443118, 12.7), (-10.058366869, 12.192000006), (-10.566443095, 12.699847501))
            ThreePointArc((-10.566443095, 12.699847501), (-12.082537762, 12.08250727), (-12.699846982, 10.566399977))
            ThreePointArc((-12.699846982, 10.566399977), (-12.192000006, 10.058323491), (-12.7, 9.5504))
            Line((-12.7, 9.5504), (-12.7, 6.3330836))
            ThreePointArc((-12.7, 6.3330836), (-12.192, 5.8250836), (-12.7, 5.3170836))
            Line((-12.7, 5.3170836), (-12.7, 4.287469289))
            ThreePointArc((-12.7, 4.287469289), (-12.39275138, 3.545705502), (-11.650987593, 3.238456882))
            Line((-11.650987593, 3.238456882), (-11.539212407, 3.238456882))
            ThreePointArc((-11.539212407, 3.238456882), (-10.79744862, 3.545705502), (-10.4902, 4.287469289))
            Line((-10.4902, 4.287469289), (-10.4902, 6.402089023))
            ThreePointArc((-10.4902, 6.402089023), (-9.856505071, 7.351067942), (-8.737131347, 7.129408934))
            Line((-8.737131347, 7.129408934), (-5.441005833, 3.840816462))
            ThreePointArc((-5.441005833, 3.840816462), (-4.750877967, 2.809883091), (-4.5085, 1.593185507))
            Line((-4.5085, 1.593185507), (-4.5085, -1.593185507))
            ThreePointArc((-4.5085, -1.593185507), (-4.750877967, -2.809883091), (-5.441005833, -3.840816462))
            Line((-5.441005833, -3.840816462), (-8.737131347, -7.129408934))
            ThreePointArc((-8.737131347, -7.129408934), (-9.856505071, -7.351067942), (-10.4902, -6.402089023))
            Line((-10.4902, -6.402089023), (-10.4902, -4.287469289))
            ThreePointArc((-10.4902, -4.287469289), (-10.79744862, -3.545705502), (-11.539212407, -3.238456882))
            Line((-11.539212407, -3.238456882), (-11.650987593, -3.238456882))
            ThreePointArc((-11.650987593, -3.238456882), (-12.39275138, -3.545705502), (-12.7, -4.287469289))
            Line((-12.7, -4.287469289), (-12.7, -5.3170836))
            ThreePointArc((-12.7, -5.3170836), (-12.192, -5.8250836), (-12.7, -6.3330836))
            Line((-12.7, -6.3330836), (-12.7, -9.5504))
            ThreePointArc((-12.7, -9.5504), (-12.192000006, -10.058323491), (-12.699846982, -10.566399977))
            ThreePointArc((-12.699846982, -10.566399977), (-12.082537762, -12.08250727), (-10.566443095, -12.699847501))
            ThreePointArc((-10.566443095, -12.699847501), (-10.058366869, -12.192000006), (-9.550443118, -12.7))
            Line((-9.550443118, -12.7), (-6.333126718, -12.7))
            ThreePointArc((-6.333126718, -12.7), (-5.825126718, -12.192), (-5.317126718, -12.7))
            Line((-5.317126718, -12.7), (-4.287512407, -12.7))
            ThreePointArc((-4.287512407, -12.7), (-3.54574862, -12.39275138), (-3.2385, -11.650987593))
            Line((-3.2385, -11.650987593), (-3.2385, -11.539212407))
            ThreePointArc((-3.2385, -11.539212407), (-3.54574862, -10.79744862), (-4.287512407, -10.4902))
            Line((-4.287512407, -10.4902), (-6.416408329, -10.4902))
            ThreePointArc((-6.416408329, -10.4902), (-7.41473083, -9.822813117), (-7.179650497, -8.645192506))
        make_face()
        Circle(SKETCH1_R, mode=Mode.SUBTRACT)
    extrude(amount=BOSS_EXTRUDE1_DEPTH, both=True)

    # Sketch2 → Cut-Extrude1 (cut)
    with BuildSketch(Plane(origin=(12.7, 0, 0), x_dir=(0, 0, -1), z_dir=(1, 0, 0))):
        with Locations((-622.565020226, -0.58573738)):
            Rectangle(SKETCH2_W, SKETCH2_H)
        with Locations((375.067711741, 0.118534447)):
            Rectangle(SKETCH2_W_2, SKETCH2_H_2)
    extrude(amount=-CUT_EXTRUDE1_DEPTH, mode=Mode.SUBTRACT)


solid = part.part
